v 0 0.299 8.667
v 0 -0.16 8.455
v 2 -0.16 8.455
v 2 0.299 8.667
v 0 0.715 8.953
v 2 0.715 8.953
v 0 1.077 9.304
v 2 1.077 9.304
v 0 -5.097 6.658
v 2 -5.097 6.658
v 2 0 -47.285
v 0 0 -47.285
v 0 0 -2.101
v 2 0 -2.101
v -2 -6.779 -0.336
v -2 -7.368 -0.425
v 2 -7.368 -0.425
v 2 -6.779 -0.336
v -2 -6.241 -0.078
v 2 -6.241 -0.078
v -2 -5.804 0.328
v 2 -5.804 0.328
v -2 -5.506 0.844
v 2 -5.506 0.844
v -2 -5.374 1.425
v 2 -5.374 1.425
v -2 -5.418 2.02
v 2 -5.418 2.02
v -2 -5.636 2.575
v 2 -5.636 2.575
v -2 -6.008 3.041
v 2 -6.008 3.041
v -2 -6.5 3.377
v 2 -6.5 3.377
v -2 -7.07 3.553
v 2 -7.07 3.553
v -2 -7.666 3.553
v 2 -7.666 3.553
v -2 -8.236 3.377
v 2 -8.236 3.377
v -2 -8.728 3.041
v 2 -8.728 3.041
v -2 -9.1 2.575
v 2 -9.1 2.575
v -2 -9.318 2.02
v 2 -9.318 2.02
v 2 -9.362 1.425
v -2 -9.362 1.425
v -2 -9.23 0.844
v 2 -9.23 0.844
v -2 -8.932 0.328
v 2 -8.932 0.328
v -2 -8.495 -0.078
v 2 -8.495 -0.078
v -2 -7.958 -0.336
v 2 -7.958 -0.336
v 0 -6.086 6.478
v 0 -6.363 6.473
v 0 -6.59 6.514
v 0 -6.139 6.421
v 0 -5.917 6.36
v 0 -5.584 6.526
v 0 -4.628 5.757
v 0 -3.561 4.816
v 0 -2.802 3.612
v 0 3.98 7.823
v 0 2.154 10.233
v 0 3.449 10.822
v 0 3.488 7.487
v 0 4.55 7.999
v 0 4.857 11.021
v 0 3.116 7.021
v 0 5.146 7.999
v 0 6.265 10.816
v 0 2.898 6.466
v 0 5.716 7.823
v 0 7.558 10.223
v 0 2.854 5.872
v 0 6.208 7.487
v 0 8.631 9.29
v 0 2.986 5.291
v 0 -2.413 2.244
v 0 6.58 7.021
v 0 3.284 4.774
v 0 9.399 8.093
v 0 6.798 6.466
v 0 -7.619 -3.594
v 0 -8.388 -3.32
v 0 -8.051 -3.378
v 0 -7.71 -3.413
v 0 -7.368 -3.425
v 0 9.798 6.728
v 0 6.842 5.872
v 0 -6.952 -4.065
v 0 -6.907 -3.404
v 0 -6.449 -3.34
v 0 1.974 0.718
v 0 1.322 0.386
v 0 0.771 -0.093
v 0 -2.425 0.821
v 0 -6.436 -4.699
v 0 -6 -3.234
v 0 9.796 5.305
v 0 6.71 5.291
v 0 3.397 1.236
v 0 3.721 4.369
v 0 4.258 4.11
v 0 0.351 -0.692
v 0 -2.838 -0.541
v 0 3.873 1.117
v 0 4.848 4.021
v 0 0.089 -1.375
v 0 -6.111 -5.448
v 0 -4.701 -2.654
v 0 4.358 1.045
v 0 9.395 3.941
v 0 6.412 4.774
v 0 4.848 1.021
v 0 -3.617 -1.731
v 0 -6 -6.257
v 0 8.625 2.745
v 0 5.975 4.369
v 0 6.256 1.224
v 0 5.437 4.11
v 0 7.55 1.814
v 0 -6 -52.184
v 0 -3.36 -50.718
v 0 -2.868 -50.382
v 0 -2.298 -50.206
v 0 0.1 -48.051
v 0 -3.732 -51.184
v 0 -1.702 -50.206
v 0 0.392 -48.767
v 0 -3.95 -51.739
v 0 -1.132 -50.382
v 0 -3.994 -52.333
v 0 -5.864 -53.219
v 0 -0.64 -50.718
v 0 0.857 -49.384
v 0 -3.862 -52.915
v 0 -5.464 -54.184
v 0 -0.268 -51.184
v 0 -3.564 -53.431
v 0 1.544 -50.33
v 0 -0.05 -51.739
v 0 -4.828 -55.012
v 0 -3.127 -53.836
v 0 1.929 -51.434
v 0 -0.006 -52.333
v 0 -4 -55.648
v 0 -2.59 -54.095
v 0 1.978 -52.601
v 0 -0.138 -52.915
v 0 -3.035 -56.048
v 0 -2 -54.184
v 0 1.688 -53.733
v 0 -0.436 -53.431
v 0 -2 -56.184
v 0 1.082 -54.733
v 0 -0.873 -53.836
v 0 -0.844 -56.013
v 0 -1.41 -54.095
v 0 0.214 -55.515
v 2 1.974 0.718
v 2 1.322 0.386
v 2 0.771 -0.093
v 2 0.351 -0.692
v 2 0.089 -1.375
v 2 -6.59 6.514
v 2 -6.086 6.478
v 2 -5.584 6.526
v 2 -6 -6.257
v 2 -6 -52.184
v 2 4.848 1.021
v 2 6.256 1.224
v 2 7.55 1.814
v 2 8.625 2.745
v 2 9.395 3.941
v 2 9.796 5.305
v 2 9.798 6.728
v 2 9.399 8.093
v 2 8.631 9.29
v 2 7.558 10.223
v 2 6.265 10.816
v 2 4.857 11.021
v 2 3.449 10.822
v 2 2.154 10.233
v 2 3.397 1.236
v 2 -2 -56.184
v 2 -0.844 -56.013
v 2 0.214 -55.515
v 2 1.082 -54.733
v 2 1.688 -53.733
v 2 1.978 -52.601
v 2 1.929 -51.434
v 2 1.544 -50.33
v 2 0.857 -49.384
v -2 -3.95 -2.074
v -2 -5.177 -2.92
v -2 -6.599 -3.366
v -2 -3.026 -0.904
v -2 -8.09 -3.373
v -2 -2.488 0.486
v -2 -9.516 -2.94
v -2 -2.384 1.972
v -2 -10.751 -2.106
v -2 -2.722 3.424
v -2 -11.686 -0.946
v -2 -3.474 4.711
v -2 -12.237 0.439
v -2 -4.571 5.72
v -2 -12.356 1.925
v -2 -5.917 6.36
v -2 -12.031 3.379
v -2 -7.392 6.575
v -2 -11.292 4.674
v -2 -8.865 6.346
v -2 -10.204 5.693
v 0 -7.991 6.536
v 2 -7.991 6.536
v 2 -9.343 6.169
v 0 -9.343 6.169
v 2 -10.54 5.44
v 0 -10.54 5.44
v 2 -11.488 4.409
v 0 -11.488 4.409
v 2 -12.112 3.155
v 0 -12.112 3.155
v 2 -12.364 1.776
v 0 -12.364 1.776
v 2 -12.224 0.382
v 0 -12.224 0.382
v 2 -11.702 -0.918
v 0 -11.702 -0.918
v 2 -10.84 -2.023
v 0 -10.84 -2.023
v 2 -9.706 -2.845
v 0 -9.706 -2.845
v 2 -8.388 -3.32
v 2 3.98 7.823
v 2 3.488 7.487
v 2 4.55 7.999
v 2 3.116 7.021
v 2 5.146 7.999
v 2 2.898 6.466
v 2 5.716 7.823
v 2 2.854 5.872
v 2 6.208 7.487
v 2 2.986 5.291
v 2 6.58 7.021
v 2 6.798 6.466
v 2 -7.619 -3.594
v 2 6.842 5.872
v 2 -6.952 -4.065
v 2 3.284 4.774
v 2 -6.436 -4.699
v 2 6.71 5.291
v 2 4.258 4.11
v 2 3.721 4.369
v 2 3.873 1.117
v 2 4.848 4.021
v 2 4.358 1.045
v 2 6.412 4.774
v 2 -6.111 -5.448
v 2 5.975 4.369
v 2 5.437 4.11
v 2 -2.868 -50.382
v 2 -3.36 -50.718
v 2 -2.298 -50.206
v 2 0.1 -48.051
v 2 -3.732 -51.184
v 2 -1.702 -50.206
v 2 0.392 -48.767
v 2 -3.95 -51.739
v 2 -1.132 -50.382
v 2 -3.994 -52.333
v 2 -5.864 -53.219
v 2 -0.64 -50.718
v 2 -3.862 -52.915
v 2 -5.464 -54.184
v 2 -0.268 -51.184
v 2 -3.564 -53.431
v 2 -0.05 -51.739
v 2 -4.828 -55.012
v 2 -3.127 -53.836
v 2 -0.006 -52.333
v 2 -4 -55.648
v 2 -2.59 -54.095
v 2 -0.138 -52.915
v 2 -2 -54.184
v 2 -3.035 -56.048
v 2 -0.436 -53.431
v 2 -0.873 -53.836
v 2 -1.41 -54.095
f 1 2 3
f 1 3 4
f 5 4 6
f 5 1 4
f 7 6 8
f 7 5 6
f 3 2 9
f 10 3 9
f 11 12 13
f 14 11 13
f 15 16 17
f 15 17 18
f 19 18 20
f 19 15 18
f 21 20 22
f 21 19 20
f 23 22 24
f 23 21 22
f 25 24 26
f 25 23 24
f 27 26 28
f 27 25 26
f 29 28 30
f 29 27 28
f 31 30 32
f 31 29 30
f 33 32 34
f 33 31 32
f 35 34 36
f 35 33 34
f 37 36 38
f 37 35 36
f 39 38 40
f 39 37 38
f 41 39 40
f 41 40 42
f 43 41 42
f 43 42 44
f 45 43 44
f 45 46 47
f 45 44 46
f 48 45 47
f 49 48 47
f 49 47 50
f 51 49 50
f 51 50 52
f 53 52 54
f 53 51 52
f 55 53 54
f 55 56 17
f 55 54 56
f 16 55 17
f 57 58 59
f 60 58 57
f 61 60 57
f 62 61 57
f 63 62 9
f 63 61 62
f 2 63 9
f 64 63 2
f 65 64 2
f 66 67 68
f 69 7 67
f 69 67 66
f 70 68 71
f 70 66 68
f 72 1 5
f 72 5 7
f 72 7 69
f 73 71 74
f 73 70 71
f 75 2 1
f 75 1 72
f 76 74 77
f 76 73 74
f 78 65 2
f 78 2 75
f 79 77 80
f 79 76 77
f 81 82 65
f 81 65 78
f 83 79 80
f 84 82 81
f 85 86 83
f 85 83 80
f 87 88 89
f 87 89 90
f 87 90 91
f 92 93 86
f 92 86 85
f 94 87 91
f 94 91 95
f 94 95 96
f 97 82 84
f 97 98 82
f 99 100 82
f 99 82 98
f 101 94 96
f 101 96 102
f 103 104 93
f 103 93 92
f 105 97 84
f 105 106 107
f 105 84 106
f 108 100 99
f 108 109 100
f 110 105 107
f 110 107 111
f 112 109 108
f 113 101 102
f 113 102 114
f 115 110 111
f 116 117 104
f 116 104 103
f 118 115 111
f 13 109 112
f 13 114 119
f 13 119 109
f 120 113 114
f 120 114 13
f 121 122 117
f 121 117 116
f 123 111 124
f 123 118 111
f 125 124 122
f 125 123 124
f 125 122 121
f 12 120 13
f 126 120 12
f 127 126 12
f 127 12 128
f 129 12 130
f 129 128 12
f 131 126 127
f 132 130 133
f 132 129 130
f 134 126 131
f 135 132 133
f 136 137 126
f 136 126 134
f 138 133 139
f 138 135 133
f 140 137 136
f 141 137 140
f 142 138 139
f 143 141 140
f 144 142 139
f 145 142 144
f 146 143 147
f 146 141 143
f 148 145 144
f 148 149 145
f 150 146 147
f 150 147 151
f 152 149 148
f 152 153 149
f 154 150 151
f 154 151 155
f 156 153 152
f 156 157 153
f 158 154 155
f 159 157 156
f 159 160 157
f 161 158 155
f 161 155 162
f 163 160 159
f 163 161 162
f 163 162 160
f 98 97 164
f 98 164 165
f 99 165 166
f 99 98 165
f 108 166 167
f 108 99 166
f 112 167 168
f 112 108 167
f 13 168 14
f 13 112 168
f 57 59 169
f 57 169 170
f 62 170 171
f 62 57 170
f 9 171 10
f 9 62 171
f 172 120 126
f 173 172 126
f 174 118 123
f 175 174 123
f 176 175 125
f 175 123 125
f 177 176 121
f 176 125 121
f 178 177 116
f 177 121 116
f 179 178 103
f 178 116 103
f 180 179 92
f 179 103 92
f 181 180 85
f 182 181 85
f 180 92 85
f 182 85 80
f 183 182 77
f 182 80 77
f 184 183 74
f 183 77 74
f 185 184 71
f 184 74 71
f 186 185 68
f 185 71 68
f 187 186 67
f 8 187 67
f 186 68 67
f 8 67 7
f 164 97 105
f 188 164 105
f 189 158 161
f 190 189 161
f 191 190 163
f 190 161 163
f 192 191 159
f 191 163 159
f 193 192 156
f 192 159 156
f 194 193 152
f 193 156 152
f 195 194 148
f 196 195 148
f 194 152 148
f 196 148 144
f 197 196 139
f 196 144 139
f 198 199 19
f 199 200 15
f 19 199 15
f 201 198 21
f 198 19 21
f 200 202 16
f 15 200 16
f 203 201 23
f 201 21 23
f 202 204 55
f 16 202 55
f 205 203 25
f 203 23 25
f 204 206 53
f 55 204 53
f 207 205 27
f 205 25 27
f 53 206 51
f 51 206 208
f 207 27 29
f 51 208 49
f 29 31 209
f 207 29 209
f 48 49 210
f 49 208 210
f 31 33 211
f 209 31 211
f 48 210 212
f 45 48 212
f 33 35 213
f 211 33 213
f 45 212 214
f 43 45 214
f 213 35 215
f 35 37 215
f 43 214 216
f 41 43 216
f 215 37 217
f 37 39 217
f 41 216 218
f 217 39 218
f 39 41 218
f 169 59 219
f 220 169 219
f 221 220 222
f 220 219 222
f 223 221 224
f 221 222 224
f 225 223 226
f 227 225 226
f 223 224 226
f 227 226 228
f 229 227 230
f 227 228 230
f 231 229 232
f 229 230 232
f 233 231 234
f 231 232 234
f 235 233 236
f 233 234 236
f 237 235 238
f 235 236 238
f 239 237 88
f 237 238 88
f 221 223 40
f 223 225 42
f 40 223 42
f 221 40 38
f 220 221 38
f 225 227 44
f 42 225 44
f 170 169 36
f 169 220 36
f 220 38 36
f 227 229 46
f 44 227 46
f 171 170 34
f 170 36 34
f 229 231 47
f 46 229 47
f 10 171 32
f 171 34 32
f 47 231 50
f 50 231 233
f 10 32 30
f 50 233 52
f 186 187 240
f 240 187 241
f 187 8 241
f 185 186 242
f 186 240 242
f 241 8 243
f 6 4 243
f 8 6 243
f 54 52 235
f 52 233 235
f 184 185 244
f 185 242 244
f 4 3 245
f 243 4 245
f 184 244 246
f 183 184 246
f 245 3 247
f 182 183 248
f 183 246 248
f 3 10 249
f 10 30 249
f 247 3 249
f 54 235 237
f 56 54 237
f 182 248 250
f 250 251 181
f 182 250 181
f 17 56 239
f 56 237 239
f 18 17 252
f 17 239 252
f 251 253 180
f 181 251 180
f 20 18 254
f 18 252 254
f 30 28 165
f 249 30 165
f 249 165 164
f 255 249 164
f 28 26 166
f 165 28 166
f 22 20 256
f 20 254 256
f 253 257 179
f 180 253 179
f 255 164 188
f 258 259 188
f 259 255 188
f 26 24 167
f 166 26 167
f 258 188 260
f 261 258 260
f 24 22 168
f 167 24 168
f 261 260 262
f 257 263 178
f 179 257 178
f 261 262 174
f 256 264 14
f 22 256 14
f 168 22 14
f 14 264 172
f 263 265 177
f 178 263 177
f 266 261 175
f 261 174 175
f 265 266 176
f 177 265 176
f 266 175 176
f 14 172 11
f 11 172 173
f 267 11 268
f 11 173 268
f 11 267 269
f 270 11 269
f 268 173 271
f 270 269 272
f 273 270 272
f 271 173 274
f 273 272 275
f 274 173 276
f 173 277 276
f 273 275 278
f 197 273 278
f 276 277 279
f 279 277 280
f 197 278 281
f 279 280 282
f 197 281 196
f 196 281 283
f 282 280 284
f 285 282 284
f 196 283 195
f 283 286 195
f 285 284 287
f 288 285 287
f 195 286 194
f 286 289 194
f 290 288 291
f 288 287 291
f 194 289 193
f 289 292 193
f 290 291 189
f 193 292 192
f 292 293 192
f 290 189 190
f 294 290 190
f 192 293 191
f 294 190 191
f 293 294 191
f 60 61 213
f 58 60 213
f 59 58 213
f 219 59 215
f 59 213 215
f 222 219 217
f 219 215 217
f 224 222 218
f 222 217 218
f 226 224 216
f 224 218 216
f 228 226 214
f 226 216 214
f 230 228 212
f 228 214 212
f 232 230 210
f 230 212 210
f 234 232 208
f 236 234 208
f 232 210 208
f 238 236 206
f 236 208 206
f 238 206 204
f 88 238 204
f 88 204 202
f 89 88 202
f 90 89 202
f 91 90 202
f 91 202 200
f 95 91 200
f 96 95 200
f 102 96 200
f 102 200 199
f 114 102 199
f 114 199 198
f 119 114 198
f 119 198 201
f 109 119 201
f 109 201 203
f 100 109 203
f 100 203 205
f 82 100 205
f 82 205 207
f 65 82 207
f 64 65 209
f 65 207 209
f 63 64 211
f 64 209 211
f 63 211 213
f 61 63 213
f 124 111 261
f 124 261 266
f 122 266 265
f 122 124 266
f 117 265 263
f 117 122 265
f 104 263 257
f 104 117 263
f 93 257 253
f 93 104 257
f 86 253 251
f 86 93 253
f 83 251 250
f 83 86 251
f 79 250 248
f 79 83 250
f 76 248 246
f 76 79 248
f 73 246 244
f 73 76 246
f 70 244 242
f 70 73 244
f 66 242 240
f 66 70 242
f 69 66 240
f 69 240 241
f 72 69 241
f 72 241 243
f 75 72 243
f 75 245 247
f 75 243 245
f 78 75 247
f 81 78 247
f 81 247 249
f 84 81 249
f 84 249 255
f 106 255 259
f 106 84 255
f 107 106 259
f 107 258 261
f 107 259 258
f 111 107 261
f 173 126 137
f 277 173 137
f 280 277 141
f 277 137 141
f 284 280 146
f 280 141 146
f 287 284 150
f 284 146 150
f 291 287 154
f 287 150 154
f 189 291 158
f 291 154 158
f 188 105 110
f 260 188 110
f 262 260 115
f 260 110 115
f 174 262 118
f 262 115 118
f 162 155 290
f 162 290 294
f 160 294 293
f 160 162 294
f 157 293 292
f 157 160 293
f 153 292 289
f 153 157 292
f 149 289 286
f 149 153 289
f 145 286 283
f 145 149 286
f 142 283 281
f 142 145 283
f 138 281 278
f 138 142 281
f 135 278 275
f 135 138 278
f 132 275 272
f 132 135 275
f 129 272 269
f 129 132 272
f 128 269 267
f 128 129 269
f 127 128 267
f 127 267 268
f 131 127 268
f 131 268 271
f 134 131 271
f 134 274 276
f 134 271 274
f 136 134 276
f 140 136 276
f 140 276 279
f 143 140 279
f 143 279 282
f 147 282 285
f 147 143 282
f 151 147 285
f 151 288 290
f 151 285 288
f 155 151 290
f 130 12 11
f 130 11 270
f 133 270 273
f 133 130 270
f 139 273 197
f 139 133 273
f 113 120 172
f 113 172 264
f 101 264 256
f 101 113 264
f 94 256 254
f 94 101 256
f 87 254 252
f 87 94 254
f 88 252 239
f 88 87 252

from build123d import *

# Parameters (mm, degrees)
EXTRUDE_1_DEPTH          = 2
EXTRUDE_START            = -2
SKETCH_1_4_R             = 5
EXTRUDE_2_DEPTH          = 2
CUT_EXTRUDE_1_DEPTH      = 58.563801167
CUT_EXTRUDE_1_DEPTH_BACK = 58.563801167
SKETCH_1_3_R             = 2
FILLET_1_R               = 3


with BuildPart() as part:
    # 草图1 → 凸台-拉伸1 (new body)
    with BuildSketch(Plane(origin=(0, 0, 0), x_dir=(0, 0, -1), z_dir=(1, 0, 0))):
        with BuildLine():
            Line((48.71971979, 0), (0, 0))
            Line((0, 0), (1.157760976, -3.180922138))
            ThreePointArc((1.157760976, -3.180922138), (2.450828184, -4.402761461), (3.234245818, -6))
            Line((3.234245818, -6), (52.183821406, -6))
            ThreePointArc((52.183821406, -6), (48.71971979, -4), (48.71971979, 0))
        make_face()
        with BuildLine():
            Line((1.157760976, -3.180922138), (0, 0))
            Line((0, 0), (-1.236380028, 3.396926208))
            ThreePointArc((-1.236380028, 3.396926208), (-4.311110224, 0.149460393), (-8.753920994, 0.660765061))
            Line((-8.753920994, 0.660765061), (-6.359779991, -5.917083284))
            ThreePointArc((-6.359779991, -5.917083284), (-3.285049794, -2.669617469), (1.157760976, -3.180922138))
        make_face()
        with BuildLine():
            ThreePointArc((56.183821406, -2), (53.219097586, 1.863703305), (48.71971979, 0))
            Line((48.71971979, 0), (52.183821406, 0))
            ThreePointArc((52.183821406, 0), (53.598034968, -0.585786438), (54.183821406, -2))
            ThreePointArc((54.183821406, -2), (53.598034968, -3.414213562), (52.183821406, -4))
            Line((52.183821406, -4), (52.183821406, -6))
            ThreePointArc((52.183821406, -6), (55.01224853, -4.828427125), (56.183821406, -2))
        make_face()
        with BuildLine():
            Line((52.183821406, 0), (48.71971979, 0))
            ThreePointArc((48.71971979, 0), (48.71971979, -4), (52.183821406, -6))
            Line((52.183821406, -6), (52.183821406, -4))
            ThreePointArc((52.183821406, -4), (50.183821406, -2), (52.183821406, 0))
        make_face()
        with BuildLine():
            ThreePointArc((3.234245818, -6), (2.450828184, -4.402761461), (1.157760976, -3.180922138))
            Line((1.157760976, -3.180922138), (2.183821406, -6))
            Line((2.183821406, -6), (3.234245818, -6))
        make_face()
        with BuildLine():
            Line((2.183821406, -6), (1.157760976, -3.180922138))
            ThreePointArc((1.157760976, -3.180922138), (-3.285049794, -2.669617469), (-6.359779991, -5.917083284))
            Line((-6.359779991, -5.917083284), (-5.333719561, -8.736161147))
            Line((-5.333719561, -8.736161147), (-3.454334319, -8.05212086))
            ThreePointArc((-3.454334319, -8.05212086), (-2.258989364, -5.488695332), (0.304436164, -6.684040287))
            Line((0.304436164, -6.684040287), (2.183821406, -6))
        make_face()
        with BuildLine():
            ThreePointArc((-8.753920994, 0.660765061), (-4.311110224, 0.149460393), (-1.236380028, 3.396926208))
            Line((-1.236380028, 3.396926208), (-2.262440458, 6.21600407))
            Line((-2.262440458, 6.21600407), (-4.141825699, 5.531963784))
            ThreePointArc((-4.141825699, 5.531963784), (-4.051595435, 5.195219852), (-4.021210941, 4.847923497))
            ThreePointArc((-4.021210941, 4.847923497), (-5.673914585, 2.878307991), (-7.900596182, 4.16388321))
            Line((-7.900596182, 4.16388321), (-9.779981424, 3.479842924))
            Line((-9.779981424, 3.479842924), (-8.753920994, 0.660765061))
        make_face()
        with BuildLine():
            Line((-2.262440458, 6.21600407), (-1.236380028, 3.396926208))
            ThreePointArc((-1.236380028, 3.396926208), (-1.075295729, 4.114491348), (-1.021210941, 4.847923497))
            ThreePointArc((-1.021210941, 4.847923497), (-8.402014349, 9.244714956), (-8.753920994, 0.660765061))
            Line((-8.753920994, 0.660765061), (-9.779981424, 3.479842924))
            Line((-9.779981424, 3.479842924), (-7.900596182, 4.16388321))
            ThreePointArc((-7.900596182, 4.16388321), (-6.705251227, 6.727308738), (-4.141825699, 5.531963784))
            Line((-4.141825699, 5.531963784), (-2.262440458, 6.21600407))
        make_face()
        with BuildLine():
            ThreePointArc((54.183821406, -2), (53.598034968, -0.585786438), (52.183821406, 0))
            Line((52.183821406, 0), (52.183821406, -4))
            ThreePointArc((52.183821406, -4), (53.598034968, -3.414213562), (54.183821406, -2))
        make_face()
        with BuildLine():
            Line((52.183821406, -4), (52.183821406, 0))
            ThreePointArc((52.183821406, 0), (50.183821406, -2), (52.183821406, -4))
        make_face()
        with BuildLine():
            Line((3.234245818, -6), (2.183821406, -6))
            Line((2.183821406, -6), (0.304436164, -6.684040287))
            ThreePointArc((0.304436164, -6.684040287), (0.394666428, -7.020784218), (0.425050922, -7.368080573))
            ThreePointArc((0.425050922, -7.368080573), (-1.227652722, -9.337696079), (-3.454334319, -8.05212086))
            Line((-3.454334319, -8.05212086), (-5.333719561, -8.736161147))
            Line((-5.333719561, -8.736161147), (-6.359779991, -5.917083284))
            ThreePointArc((-6.359779991, -5.917083284), (-2.308381227, -12.313995785), (3.425050922, -7.368080573))
            ThreePointArc((3.425050922, -7.368080573), (3.377119908, -6.677419469), (3.234245818, -6))
        make_face()
        with BuildLine():
            ThreePointArc((0.425050922, -7.368080573), (0.394666428, -7.020784218), (0.304436164, -6.684040287))
            Line((0.304436164, -6.684040287), (-3.454334319, -8.05212086))
            ThreePointArc((-3.454334319, -8.05212086), (-1.227652722, -9.337696079), (0.425050922, -7.368080573))
        make_face()
        with BuildLine():
            Line((-3.454334319, -8.05212086), (0.304436164, -6.684040287))
            ThreePointArc((0.304436164, -6.684040287), (-2.258989364, -5.488695332), (-3.454334319, -8.05212086))
        make_face()
        with BuildLine():
            ThreePointArc((-4.021210941, 4.847923497), (-4.051595435, 5.195219852), (-4.141825699, 5.531963784))
            Line((-4.141825699, 5.531963784), (-7.900596182, 4.16388321))
            ThreePointArc((-7.900596182, 4.16388321), (-5.673914585, 2.878307991), (-4.021210941, 4.847923497))
        make_face()
        with BuildLine():
            Line((-7.900596182, 4.16388321), (-4.141825699, 5.531963784))
            ThreePointArc((-4.141825699, 5.531963784), (-6.705251227, 6.727308738), (-7.900596182, 4.16388321))
        make_face()
    extrude(amount=EXTRUDE_1_DEPTH)

    # 草图1<4> → 凸台-拉伸2 (add)
    with BuildSketch(Plane(origin=(0, 0, 0), x_dir=(0, 0, -1), z_dir=(1, 0, 0)).offset(EXTRUDE_START)):
        with Locations(Location((-1.574949078, -7.368080573, 0), (0, 0, 163.130102354))):
            Circle(SKETCH_1_4_R)
    extrude(amount=EXTRUDE_2_DEPTH)

    # 草图1<3> → 切除-拉伸1 (cut, two sides: drawn at the far end of the back side and taken through both)
    with BuildSketch(Plane(origin=(0, 0, 0), x_dir=(0, 0, -1), z_dir=(1, 0, 0)).offset(-CUT_EXTRUDE_1_DEPTH_BACK)):
        with Locations((-6.021210941, 4.847923497)):
            Circle(SKETCH_1_3_R)
        with Locations((52.183821406, -2)):
            Circle(SKETCH_1_3_R)
        with Locations((-1.574949078, -7.368080573)):
            Circle(SKETCH_1_3_R)
    extrude(amount=CUT_EXTRUDE_1_DEPTH + CUT_EXTRUDE_1_DEPTH_BACK, mode=Mode.SUBTRACT)

    # 圆角1
    # the kernel refuses this fillet: 3 mm, written as the material it adds along each edge
    with BuildSketch(Plane(origin=(0, -6, -3.234245818), x_dir=(0, 0, -1), z_dir=(1, 0, 0))) as fillet_1_piece_1:
        with BuildLine():
            CenterArc((3.022589, -3), FILLET_1_R, 90, 78.229623191)
            ThreePointArc((0.085670039, -2.388030215), (0.187590709, -1.18882203), (0, 0))
            Line((0, 0), (3.022589, 0))
        make_face()
    extrude(amount=2)
    with BuildSketch(Plane(origin=(0, 0, 0), x_dir=(0, 0, -1), z_dir=(1, 0, 0))) as fillet_1_piece_2:
        with BuildLine():
            CenterArc((FILLET_1_R * 0.70020753821, FILLET_1_R), FILLET_1_R, 200, 70)
            Line((-FILLET_1_R * 0.239485082576, FILLET_1_R * 0.657979856674), (0, 0))
            Line((0, 0), (FILLET_1_R * 0.70020753821, 0))
        make_face()
    extrude(amount=2)
    with BuildSketch(Plane(origin=(0, 0, -48.71971979), x_dir=(0, 0, 1), z_dir=(1, 0, 0))) as fillet_1_piece_3:
        with BuildLine():
            CenterArc((1.43487787, -3), FILLET_1_R, 90, 44.415308597)
            ThreePointArc((-0.664684766, -0.857142857), (-0.303154074, -0.451205957), (0, 0))
            Line((0, 0), (1.43487787, 0))
        make_face()
    extrude(amount=2)
    with BuildSketch(Plane(origin=(0, 0.660765061, 8.753920994), x_dir=(0, 0.6030345104353418, 0.7977150990322344), z_dir=(1, 0, 0))) as fillet_1_piece_4:
        with BuildLine():
            CenterArc((0.897200113, 2.992846785), FILLET_1_R, 237.087538991, 28.955024372)
            Line((-0.732871014, 0.474341649), (0, 0))
            ThreePointArc((0, 0), (0.345076967, 0.011922025), (0.690153933, 0))
        make_face()
    extrude(amount=2)
    with BuildSketch(Plane(origin=(0, -5.917083284, 6.359779991), x_dir=(0, -0.974712617445799, 0.2234621072843435), z_dir=(1, 0, 0))) as fillet_1_piece_5:
        with BuildLine():
            CenterArc((0.897200113, -2.992846785), FILLET_1_R, 93.957436637, 28.955024372)
            Line((-0.732871014, -0.474341649), (0, 0))
            ThreePointArc((0, 0), (0.345076967, -0.011922025), (0.690153933, 0))
        make_face()
    extrude(amount=2)


solid = part.part
